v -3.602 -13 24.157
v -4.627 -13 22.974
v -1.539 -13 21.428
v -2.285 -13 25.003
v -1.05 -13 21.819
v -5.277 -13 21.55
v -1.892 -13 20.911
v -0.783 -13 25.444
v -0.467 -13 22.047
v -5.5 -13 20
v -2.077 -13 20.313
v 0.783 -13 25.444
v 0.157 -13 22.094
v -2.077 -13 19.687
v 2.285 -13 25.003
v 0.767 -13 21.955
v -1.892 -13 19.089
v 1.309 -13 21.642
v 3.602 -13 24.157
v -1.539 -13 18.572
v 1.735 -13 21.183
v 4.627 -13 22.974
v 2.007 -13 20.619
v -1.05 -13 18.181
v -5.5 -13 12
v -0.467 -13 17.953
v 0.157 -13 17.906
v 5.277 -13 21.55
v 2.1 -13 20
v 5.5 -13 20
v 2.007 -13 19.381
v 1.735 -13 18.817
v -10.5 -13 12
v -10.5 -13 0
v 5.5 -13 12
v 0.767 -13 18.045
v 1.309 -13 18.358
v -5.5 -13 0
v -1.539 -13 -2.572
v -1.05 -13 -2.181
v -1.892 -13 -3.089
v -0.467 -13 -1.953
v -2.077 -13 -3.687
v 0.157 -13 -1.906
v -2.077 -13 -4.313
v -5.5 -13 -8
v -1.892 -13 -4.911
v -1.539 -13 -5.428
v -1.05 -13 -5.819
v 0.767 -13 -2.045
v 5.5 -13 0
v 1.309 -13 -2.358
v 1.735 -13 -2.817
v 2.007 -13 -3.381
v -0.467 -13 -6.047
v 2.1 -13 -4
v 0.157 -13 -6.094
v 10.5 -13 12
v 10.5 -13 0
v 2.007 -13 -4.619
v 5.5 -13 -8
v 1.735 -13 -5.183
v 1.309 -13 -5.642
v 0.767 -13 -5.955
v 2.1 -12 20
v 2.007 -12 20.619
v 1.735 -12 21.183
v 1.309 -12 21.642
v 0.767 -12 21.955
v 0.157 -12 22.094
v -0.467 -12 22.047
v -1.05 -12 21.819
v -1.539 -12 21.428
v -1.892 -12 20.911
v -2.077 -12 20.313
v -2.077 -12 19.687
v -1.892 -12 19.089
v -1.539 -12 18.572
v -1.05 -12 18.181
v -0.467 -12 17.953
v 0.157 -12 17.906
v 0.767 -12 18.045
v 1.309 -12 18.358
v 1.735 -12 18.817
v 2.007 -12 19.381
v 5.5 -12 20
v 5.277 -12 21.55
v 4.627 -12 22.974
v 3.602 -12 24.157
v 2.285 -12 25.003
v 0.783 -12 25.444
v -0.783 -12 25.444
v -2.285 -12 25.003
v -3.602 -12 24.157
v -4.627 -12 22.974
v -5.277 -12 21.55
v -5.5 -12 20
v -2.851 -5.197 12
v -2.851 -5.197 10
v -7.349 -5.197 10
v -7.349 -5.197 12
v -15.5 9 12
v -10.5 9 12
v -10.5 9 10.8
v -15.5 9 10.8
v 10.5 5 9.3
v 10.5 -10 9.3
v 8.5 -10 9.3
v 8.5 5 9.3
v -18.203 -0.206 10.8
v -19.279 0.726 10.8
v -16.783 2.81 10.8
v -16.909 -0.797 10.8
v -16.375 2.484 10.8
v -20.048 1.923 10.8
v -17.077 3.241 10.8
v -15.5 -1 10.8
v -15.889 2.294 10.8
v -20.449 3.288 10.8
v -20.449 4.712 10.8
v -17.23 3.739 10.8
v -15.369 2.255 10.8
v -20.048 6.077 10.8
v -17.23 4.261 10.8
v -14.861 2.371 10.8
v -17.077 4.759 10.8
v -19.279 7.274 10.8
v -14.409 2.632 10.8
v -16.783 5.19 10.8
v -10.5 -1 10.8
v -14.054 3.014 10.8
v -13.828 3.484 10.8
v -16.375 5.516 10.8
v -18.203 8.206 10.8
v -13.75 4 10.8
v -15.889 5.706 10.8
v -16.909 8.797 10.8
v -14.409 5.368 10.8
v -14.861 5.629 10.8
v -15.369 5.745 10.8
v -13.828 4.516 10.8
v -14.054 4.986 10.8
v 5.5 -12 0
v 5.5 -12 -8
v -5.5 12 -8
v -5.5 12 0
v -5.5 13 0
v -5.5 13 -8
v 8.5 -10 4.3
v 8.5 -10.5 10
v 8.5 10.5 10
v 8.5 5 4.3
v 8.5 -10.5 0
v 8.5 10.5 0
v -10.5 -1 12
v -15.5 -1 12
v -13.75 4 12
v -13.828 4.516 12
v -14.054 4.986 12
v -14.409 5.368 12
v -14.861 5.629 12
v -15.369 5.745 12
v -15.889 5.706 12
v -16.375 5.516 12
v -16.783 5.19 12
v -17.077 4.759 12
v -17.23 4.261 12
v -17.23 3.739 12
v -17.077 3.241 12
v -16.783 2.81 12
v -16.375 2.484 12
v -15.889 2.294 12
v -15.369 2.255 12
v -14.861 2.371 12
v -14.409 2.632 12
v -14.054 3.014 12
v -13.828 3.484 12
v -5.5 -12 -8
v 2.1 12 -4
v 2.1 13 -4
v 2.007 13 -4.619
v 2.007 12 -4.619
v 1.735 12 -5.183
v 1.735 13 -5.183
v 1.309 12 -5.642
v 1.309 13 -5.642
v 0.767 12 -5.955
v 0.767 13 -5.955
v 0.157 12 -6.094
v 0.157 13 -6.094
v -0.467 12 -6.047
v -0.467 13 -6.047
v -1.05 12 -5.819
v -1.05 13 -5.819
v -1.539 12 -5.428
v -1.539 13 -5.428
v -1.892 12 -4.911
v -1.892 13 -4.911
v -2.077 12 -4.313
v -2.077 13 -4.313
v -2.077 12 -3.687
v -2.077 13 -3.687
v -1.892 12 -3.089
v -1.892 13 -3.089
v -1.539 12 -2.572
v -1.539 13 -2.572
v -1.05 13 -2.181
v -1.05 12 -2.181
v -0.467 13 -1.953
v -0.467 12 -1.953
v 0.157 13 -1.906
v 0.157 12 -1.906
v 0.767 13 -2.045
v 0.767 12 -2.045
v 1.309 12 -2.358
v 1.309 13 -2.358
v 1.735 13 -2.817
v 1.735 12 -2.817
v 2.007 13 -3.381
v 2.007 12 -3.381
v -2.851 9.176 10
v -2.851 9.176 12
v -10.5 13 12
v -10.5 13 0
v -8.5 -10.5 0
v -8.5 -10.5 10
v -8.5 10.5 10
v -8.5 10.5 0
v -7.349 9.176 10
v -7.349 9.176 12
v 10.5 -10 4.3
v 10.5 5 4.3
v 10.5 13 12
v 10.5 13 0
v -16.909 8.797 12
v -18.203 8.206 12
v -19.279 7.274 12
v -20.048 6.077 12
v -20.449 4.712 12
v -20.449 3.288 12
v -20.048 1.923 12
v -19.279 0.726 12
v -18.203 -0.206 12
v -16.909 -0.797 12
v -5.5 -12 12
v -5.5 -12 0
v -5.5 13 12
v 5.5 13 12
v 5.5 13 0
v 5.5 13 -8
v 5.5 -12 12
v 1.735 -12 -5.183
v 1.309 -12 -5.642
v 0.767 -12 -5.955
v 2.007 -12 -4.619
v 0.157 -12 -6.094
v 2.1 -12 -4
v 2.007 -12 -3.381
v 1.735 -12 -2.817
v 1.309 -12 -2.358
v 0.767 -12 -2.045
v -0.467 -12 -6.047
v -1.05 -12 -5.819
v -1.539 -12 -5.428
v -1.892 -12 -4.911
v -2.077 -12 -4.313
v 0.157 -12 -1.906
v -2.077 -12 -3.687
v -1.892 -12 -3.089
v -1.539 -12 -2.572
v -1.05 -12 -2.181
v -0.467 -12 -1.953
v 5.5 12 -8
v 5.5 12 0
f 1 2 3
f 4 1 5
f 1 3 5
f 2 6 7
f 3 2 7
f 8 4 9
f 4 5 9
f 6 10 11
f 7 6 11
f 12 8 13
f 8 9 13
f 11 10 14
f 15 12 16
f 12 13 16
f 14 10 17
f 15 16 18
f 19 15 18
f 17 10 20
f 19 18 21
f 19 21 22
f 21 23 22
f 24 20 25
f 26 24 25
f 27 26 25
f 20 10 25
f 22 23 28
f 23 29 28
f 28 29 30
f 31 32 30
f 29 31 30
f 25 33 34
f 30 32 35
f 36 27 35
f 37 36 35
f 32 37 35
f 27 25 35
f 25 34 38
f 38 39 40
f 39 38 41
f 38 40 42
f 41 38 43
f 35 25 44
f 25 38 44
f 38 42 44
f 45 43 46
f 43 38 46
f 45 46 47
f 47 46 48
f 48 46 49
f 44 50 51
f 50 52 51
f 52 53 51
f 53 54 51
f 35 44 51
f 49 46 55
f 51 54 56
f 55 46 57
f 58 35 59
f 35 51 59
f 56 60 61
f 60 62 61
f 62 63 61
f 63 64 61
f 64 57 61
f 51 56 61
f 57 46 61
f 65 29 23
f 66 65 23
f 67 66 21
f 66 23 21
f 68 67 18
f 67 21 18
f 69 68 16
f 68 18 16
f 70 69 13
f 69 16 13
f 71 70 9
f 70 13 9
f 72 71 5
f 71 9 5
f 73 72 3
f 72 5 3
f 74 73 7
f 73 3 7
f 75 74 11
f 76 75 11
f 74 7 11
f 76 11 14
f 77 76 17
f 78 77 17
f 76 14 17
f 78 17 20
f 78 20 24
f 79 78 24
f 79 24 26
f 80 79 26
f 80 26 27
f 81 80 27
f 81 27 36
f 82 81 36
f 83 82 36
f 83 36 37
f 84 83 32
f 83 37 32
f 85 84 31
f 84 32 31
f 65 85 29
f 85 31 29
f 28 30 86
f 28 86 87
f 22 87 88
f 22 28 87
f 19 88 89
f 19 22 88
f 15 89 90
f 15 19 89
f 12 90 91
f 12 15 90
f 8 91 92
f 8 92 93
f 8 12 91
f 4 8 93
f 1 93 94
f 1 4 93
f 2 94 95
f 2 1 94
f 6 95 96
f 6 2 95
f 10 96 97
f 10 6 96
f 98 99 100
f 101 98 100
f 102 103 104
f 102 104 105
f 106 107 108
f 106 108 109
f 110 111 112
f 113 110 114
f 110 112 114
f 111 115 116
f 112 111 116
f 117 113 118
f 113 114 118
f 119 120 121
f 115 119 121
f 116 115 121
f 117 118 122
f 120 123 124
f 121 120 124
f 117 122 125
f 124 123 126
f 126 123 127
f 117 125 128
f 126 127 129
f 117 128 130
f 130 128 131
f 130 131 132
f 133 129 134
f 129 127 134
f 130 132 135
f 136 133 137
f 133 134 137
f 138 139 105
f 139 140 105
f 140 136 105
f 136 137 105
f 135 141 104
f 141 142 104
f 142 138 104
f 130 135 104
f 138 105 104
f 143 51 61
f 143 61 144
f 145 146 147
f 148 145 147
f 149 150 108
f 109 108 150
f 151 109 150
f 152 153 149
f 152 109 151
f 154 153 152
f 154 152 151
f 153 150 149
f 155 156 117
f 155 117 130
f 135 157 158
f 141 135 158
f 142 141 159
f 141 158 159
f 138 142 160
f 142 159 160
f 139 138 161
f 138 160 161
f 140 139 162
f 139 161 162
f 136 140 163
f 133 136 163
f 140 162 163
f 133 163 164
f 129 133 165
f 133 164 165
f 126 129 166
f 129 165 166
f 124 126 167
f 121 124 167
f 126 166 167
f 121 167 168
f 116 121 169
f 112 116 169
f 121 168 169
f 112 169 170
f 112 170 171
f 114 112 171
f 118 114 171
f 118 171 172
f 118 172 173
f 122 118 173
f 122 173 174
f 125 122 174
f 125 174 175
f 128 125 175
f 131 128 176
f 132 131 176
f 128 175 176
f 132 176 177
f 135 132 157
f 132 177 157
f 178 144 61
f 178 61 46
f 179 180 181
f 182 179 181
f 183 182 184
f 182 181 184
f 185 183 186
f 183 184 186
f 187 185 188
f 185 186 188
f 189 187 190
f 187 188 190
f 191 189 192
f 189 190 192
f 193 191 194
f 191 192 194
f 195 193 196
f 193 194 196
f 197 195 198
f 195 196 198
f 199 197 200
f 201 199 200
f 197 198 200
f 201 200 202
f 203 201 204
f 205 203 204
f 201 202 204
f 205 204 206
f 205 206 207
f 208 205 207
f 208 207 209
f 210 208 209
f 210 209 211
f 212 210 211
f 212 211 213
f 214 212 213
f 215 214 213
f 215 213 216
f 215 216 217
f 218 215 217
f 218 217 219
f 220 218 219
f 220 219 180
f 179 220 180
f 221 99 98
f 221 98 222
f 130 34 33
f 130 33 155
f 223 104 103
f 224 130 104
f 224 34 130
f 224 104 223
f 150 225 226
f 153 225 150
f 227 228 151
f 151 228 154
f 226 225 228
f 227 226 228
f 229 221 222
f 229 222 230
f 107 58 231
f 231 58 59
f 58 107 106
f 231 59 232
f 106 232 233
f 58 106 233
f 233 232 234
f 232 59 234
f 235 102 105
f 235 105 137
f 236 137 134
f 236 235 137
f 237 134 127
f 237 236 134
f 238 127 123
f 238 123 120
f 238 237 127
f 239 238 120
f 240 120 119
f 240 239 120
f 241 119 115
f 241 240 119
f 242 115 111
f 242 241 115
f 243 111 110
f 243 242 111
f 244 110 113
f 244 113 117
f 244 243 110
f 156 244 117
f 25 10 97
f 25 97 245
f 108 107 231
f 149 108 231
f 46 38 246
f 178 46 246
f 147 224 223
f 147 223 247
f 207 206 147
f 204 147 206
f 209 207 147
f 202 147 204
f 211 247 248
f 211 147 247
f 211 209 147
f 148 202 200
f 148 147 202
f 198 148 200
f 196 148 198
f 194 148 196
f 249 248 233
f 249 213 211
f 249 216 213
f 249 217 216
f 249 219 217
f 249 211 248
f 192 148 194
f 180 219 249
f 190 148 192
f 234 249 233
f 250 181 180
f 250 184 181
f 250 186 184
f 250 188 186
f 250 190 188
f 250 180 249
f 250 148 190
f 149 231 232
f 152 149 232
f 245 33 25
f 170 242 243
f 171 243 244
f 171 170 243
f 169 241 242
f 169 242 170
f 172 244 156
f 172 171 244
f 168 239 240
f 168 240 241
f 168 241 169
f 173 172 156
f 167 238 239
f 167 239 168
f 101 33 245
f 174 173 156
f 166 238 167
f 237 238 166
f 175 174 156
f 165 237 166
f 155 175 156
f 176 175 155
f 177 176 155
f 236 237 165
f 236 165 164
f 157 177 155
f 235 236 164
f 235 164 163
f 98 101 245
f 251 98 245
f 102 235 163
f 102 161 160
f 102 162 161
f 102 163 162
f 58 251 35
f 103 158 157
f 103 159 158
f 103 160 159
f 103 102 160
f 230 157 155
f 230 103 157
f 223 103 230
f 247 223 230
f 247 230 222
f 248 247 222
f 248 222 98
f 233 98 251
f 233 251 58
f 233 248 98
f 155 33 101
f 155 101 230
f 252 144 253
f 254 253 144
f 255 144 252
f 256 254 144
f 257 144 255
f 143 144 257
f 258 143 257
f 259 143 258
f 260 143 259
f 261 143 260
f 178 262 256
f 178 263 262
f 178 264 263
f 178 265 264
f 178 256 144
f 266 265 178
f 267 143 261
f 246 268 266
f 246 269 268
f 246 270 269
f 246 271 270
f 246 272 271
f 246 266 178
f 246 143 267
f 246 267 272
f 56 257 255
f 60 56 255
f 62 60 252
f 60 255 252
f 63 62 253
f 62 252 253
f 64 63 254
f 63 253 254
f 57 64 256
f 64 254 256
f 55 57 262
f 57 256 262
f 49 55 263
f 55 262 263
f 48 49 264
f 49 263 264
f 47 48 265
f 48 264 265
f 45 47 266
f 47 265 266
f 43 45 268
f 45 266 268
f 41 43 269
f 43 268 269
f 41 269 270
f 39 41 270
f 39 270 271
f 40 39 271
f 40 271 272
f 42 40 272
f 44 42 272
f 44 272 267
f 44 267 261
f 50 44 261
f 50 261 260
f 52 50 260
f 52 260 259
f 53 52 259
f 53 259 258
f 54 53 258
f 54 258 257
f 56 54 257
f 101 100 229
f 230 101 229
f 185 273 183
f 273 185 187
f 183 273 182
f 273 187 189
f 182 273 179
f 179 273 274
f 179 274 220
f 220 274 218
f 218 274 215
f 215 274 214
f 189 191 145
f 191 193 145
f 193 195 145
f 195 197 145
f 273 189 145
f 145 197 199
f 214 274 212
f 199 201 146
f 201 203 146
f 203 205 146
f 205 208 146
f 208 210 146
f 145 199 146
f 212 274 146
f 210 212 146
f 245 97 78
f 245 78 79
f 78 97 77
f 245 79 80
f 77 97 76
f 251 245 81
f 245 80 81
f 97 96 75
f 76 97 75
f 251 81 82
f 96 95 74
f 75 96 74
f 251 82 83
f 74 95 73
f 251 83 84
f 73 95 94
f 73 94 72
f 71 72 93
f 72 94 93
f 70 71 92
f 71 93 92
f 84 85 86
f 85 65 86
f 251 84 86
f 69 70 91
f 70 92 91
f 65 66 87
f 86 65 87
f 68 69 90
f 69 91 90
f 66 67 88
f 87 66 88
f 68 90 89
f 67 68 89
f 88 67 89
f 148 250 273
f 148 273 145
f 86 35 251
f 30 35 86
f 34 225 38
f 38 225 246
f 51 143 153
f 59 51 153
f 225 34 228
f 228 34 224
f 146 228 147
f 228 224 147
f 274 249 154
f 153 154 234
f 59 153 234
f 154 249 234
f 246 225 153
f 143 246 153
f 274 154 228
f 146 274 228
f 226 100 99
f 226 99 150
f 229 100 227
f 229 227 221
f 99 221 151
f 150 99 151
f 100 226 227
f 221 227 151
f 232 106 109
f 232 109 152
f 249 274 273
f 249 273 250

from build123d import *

# Parameters (mm, degrees)
SKETCH1_W            = 21
SKETCH1_H            = 26
SKETCH1_W_2          = 17
SKETCH1_H_2          = 21
BOSS_EXTRUDE1_DEPTH  = 10
SKETCH2_W            = 21
SKETCH2_H            = 26
BOSS_EXTRUDE2_DEPTH  = 2
SKETCH4_W            = 5
SKETCH4_H            = 15
CUT_EXTRUDE2_DEPTH   = 2
SKETCH6_R            = 1.76
BOSS_EXTRUDE3_DEPTH  = 2
SKETCH9_R            = 1.76
BOSS_EXTRUDE5_DEPTH  = 2
SKETCH14_W           = 11
SKETCH14_H           = 1
BOSS_EXTRUDE8_DEPTH  = 8
SKETCH16_R           = 2.1
CUT_EXTRUDE3_DEPTH   = 36
SKETCH17_R           = 1.75
BOSS_EXTRUDE9_DEPTH  = 1.2
SKETCH18_W           = 11
SKETCH18_H           = 14.770488881
CUT_EXTRUDE4_DEPTH   = 3.2
SKETCH19_W           = 11
SKETCH19_H           = 14.236904858
CUT_EXTRUDE5_DEPTH   = 10
SKETCH20_R           = 2.1
BOSS_EXTRUDE10_DEPTH = 1
SKETCH22_W           = 4.498408698
SKETCH22_H           = 14.372964376
CUT_EXTRUDE6_DEPTH   = 10


with BuildPart() as part:
    # Sketch1 → Boss-Extrude1 (new body)
    with BuildSketch(Plane.XY):
        Rectangle(SKETCH1_W, SKETCH1_H)
        Rectangle(SKETCH1_W_2, SKETCH1_H_2, mode=Mode.SUBTRACT)
    extrude(amount=BOSS_EXTRUDE1_DEPTH)

    # Sketch2 → Boss-Extrude2 (add)
    with BuildSketch(Plane.XY.offset(10)):
        Rectangle(SKETCH2_W, SKETCH2_H)
    extrude(amount=BOSS_EXTRUDE2_DEPTH)

    # Sketch4 → Cut-Extrude2 (cut)
    with BuildSketch(Plane(origin=(10.5, 0, 0), x_dir=(0, 0, -1), z_dir=(1, 0, 0))):
        with Locations((-6.8, -2.5)):
            Rectangle(SKETCH4_W, SKETCH4_H)
    extrude(amount=-CUT_EXTRUDE2_DEPTH, mode=Mode.SUBTRACT)

    # Sketch6 → Boss-Extrude3 (add)
    with BuildSketch(Plane.XY.offset(12)):
        with BuildLine():
            Line((0, 13), (5.5, 13))
            Line((5.5, 13), (5.5, 18))
            ThreePointArc((5.5, 18), (0, 23.5), (-5.5, 18))
            Line((-5.5, 18), (-5.5, 13))
            Line((-5.5, 13), (0, 13))
        make_face()
        with Locations((0, 18)):
            Circle(SKETCH6_R, mode=Mode.SUBTRACT)
    extrude(amount=-BOSS_EXTRUDE3_DEPTH)

    # Sketch9 → Boss-Extrude5 (add)
    with BuildSketch(Plane.XY.offset(12)):
        with BuildLine():
            Line((0, -13), (-5.5, -13))
            Line((-5.5, -13), (-5.5, -18))
            ThreePointArc((-5.5, -18), (0, -23.5), (5.5, -18))
            Line((5.5, -18), (5.5, -13))
            Line((5.5, -13), (0, -13))
        make_face()
        with Locations((0, -18)):
            Circle(SKETCH9_R, mode=Mode.SUBTRACT)
    extrude(amount=-BOSS_EXTRUDE5_DEPTH)

    # Sketch14 → Boss-Extrude8 (add)
    with BuildSketch(Plane(origin=(0, 0, 0), x_dir=(-1, 0, 0), z_dir=(0, 0, -1))):
        with Locations((0, -12.5)):
            Rectangle(SKETCH14_W, SKETCH14_H)
        with Locations((0, 12.5)):
            Rectangle(SKETCH14_W, SKETCH14_H)
    extrude(amount=BOSS_EXTRUDE8_DEPTH)

    # Sketch16 → Cut-Extrude3 (cut)
    with BuildSketch(Plane(origin=(0, 13, 0), x_dir=(1, 0, 0), z_dir=(0, 1, 0))):
        with Locations((0, 4)):
            Circle(SKETCH16_R)
    extrude(amount=-CUT_EXTRUDE3_DEPTH, mode=Mode.SUBTRACT)

    # Sketch17 → Boss-Extrude9 (add)
    with BuildSketch(Plane.XY.offset(12)):
        with BuildLine():
            Line((-15.5, -1), (-10.5, -1))
            Line((-10.5, -1), (-10.5, 9))
            Line((-10.5, 9), (-15.5, 9))
            ThreePointArc((-15.5, 9), (-20.5, 4), (-15.5, -1))
        make_face()
        with Locations((-15.5, 4)):
            Circle(SKETCH17_R, mode=Mode.SUBTRACT)
    extrude(amount=-BOSS_EXTRUDE9_DEPTH)

    # Sketch18 → Cut-Extrude4 (cut)
    with BuildSketch(Plane.XY.offset(12)):
        with Locations((0, 20.385244441)):
            Rectangle(SKETCH18_W, SKETCH18_H)
    extrude(amount=-CUT_EXTRUDE4_DEPTH, mode=Mode.SUBTRACT)

    # Sketch19 → Cut-Extrude5 (cut)
    with BuildSketch(Plane.XY.offset(12)):
        with Locations((0, -20.118452429)):
            Rectangle(SKETCH19_W, SKETCH19_H)
    extrude(amount=-CUT_EXTRUDE5_DEPTH, mode=Mode.SUBTRACT)

    # Sketch20 → Boss-Extrude10 (add)
    with BuildSketch(Plane.XZ.offset(13)):
        with BuildLine():
            Line((0, 12), (5.5, 12))
            Line((5.5, 12), (5.5, 20))
            ThreePointArc((5.5, 20), (0, 25.5), (-5.5, 20))
            Line((-5.5, 20), (-5.5, 12))
            Line((-5.5, 12), (0, 12))
        make_face()
        with Locations((0, 20)):
            Circle(SKETCH20_R, mode=Mode.SUBTRACT)
    extrude(amount=-BOSS_EXTRUDE10_DEPTH)

    # Sketch22 → Cut-Extrude6 (cut)
    with BuildSketch(Plane(origin=(0, 0, 10), x_dir=(-1, 0, 0), z_dir=(0, 0, -1))):
        with Locations((5.100019104, 1.989760377)):
            Rectangle(SKETCH22_W, SKETCH22_H)
    extrude(amount=-CUT_EXTRUDE6_DEPTH, mode=Mode.SUBTRACT)


solid = part.part
